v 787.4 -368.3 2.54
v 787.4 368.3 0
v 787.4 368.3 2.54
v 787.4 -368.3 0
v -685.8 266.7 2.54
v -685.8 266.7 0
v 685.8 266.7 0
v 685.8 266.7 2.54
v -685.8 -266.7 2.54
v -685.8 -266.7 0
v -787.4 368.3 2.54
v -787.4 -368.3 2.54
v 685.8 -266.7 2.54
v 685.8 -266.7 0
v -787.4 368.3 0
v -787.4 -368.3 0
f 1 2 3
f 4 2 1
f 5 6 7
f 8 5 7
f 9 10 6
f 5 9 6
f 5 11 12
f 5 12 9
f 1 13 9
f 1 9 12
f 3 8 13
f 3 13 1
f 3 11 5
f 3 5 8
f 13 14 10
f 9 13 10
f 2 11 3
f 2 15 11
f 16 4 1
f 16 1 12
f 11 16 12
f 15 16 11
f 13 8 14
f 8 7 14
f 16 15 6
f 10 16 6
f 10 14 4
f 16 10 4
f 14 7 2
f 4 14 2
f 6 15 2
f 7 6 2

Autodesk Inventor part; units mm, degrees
ref_plane "YZ Plane" through (0, 0, 0) normal (1, 0, 0) x (0, 1, 0)
ref_plane "XZ Plane" through (0, 0, 0) normal (0, 1, 0) x (-1, 0, 0)
ref_plane "XY Plane" through (0, 0, 0) normal (0, 0, 1) x (1, 0, 0)
ref_plane "Work Plane1" through (0, 0, 0) normal (0, 0, 1) x (1, 0, 0)
sketch "Sketch1" plane through (0, 0, 0) normal (0, 0, 1) x (1, 0, 0)
  line L0 (-685.8, 266.7) -> (685.8, 266.7) projected
  line L1 (-685.8, -266.7) -> (-685.8, 266.7) projected
  line L2 (685.8, -266.7) -> (-685.8, -266.7) projected
  line L3 (685.8, 266.7) -> (685.8, -266.7) projected
  line L4 (-685.8, -266.7) -> (685.8, -266.7)
  line L5 (685.8, -266.7) -> (685.8, 266.7)
  line L6 (685.8, 266.7) -> (-685.8, 266.7)
  line L7 (-685.8, 266.7) -> (-685.8, -266.7)
  line L8 (-787.4, 368.3) -> (787.4, 368.3)
  line L9 (787.4, 368.3) -> (787.4, -368.3)
  line L10 (787.4, -368.3) -> (-787.4, -368.3)
  line L11 (-787.4, -368.3) -> (-787.4, 368.3)
  point P0 (0, 0)
  dimension "d0" = 101.6
extrude "Extrusion1" add sketch "Sketch1" along normal blind 2.54
properties part number "Reflective02" material "Polycarbonate, Clear"
